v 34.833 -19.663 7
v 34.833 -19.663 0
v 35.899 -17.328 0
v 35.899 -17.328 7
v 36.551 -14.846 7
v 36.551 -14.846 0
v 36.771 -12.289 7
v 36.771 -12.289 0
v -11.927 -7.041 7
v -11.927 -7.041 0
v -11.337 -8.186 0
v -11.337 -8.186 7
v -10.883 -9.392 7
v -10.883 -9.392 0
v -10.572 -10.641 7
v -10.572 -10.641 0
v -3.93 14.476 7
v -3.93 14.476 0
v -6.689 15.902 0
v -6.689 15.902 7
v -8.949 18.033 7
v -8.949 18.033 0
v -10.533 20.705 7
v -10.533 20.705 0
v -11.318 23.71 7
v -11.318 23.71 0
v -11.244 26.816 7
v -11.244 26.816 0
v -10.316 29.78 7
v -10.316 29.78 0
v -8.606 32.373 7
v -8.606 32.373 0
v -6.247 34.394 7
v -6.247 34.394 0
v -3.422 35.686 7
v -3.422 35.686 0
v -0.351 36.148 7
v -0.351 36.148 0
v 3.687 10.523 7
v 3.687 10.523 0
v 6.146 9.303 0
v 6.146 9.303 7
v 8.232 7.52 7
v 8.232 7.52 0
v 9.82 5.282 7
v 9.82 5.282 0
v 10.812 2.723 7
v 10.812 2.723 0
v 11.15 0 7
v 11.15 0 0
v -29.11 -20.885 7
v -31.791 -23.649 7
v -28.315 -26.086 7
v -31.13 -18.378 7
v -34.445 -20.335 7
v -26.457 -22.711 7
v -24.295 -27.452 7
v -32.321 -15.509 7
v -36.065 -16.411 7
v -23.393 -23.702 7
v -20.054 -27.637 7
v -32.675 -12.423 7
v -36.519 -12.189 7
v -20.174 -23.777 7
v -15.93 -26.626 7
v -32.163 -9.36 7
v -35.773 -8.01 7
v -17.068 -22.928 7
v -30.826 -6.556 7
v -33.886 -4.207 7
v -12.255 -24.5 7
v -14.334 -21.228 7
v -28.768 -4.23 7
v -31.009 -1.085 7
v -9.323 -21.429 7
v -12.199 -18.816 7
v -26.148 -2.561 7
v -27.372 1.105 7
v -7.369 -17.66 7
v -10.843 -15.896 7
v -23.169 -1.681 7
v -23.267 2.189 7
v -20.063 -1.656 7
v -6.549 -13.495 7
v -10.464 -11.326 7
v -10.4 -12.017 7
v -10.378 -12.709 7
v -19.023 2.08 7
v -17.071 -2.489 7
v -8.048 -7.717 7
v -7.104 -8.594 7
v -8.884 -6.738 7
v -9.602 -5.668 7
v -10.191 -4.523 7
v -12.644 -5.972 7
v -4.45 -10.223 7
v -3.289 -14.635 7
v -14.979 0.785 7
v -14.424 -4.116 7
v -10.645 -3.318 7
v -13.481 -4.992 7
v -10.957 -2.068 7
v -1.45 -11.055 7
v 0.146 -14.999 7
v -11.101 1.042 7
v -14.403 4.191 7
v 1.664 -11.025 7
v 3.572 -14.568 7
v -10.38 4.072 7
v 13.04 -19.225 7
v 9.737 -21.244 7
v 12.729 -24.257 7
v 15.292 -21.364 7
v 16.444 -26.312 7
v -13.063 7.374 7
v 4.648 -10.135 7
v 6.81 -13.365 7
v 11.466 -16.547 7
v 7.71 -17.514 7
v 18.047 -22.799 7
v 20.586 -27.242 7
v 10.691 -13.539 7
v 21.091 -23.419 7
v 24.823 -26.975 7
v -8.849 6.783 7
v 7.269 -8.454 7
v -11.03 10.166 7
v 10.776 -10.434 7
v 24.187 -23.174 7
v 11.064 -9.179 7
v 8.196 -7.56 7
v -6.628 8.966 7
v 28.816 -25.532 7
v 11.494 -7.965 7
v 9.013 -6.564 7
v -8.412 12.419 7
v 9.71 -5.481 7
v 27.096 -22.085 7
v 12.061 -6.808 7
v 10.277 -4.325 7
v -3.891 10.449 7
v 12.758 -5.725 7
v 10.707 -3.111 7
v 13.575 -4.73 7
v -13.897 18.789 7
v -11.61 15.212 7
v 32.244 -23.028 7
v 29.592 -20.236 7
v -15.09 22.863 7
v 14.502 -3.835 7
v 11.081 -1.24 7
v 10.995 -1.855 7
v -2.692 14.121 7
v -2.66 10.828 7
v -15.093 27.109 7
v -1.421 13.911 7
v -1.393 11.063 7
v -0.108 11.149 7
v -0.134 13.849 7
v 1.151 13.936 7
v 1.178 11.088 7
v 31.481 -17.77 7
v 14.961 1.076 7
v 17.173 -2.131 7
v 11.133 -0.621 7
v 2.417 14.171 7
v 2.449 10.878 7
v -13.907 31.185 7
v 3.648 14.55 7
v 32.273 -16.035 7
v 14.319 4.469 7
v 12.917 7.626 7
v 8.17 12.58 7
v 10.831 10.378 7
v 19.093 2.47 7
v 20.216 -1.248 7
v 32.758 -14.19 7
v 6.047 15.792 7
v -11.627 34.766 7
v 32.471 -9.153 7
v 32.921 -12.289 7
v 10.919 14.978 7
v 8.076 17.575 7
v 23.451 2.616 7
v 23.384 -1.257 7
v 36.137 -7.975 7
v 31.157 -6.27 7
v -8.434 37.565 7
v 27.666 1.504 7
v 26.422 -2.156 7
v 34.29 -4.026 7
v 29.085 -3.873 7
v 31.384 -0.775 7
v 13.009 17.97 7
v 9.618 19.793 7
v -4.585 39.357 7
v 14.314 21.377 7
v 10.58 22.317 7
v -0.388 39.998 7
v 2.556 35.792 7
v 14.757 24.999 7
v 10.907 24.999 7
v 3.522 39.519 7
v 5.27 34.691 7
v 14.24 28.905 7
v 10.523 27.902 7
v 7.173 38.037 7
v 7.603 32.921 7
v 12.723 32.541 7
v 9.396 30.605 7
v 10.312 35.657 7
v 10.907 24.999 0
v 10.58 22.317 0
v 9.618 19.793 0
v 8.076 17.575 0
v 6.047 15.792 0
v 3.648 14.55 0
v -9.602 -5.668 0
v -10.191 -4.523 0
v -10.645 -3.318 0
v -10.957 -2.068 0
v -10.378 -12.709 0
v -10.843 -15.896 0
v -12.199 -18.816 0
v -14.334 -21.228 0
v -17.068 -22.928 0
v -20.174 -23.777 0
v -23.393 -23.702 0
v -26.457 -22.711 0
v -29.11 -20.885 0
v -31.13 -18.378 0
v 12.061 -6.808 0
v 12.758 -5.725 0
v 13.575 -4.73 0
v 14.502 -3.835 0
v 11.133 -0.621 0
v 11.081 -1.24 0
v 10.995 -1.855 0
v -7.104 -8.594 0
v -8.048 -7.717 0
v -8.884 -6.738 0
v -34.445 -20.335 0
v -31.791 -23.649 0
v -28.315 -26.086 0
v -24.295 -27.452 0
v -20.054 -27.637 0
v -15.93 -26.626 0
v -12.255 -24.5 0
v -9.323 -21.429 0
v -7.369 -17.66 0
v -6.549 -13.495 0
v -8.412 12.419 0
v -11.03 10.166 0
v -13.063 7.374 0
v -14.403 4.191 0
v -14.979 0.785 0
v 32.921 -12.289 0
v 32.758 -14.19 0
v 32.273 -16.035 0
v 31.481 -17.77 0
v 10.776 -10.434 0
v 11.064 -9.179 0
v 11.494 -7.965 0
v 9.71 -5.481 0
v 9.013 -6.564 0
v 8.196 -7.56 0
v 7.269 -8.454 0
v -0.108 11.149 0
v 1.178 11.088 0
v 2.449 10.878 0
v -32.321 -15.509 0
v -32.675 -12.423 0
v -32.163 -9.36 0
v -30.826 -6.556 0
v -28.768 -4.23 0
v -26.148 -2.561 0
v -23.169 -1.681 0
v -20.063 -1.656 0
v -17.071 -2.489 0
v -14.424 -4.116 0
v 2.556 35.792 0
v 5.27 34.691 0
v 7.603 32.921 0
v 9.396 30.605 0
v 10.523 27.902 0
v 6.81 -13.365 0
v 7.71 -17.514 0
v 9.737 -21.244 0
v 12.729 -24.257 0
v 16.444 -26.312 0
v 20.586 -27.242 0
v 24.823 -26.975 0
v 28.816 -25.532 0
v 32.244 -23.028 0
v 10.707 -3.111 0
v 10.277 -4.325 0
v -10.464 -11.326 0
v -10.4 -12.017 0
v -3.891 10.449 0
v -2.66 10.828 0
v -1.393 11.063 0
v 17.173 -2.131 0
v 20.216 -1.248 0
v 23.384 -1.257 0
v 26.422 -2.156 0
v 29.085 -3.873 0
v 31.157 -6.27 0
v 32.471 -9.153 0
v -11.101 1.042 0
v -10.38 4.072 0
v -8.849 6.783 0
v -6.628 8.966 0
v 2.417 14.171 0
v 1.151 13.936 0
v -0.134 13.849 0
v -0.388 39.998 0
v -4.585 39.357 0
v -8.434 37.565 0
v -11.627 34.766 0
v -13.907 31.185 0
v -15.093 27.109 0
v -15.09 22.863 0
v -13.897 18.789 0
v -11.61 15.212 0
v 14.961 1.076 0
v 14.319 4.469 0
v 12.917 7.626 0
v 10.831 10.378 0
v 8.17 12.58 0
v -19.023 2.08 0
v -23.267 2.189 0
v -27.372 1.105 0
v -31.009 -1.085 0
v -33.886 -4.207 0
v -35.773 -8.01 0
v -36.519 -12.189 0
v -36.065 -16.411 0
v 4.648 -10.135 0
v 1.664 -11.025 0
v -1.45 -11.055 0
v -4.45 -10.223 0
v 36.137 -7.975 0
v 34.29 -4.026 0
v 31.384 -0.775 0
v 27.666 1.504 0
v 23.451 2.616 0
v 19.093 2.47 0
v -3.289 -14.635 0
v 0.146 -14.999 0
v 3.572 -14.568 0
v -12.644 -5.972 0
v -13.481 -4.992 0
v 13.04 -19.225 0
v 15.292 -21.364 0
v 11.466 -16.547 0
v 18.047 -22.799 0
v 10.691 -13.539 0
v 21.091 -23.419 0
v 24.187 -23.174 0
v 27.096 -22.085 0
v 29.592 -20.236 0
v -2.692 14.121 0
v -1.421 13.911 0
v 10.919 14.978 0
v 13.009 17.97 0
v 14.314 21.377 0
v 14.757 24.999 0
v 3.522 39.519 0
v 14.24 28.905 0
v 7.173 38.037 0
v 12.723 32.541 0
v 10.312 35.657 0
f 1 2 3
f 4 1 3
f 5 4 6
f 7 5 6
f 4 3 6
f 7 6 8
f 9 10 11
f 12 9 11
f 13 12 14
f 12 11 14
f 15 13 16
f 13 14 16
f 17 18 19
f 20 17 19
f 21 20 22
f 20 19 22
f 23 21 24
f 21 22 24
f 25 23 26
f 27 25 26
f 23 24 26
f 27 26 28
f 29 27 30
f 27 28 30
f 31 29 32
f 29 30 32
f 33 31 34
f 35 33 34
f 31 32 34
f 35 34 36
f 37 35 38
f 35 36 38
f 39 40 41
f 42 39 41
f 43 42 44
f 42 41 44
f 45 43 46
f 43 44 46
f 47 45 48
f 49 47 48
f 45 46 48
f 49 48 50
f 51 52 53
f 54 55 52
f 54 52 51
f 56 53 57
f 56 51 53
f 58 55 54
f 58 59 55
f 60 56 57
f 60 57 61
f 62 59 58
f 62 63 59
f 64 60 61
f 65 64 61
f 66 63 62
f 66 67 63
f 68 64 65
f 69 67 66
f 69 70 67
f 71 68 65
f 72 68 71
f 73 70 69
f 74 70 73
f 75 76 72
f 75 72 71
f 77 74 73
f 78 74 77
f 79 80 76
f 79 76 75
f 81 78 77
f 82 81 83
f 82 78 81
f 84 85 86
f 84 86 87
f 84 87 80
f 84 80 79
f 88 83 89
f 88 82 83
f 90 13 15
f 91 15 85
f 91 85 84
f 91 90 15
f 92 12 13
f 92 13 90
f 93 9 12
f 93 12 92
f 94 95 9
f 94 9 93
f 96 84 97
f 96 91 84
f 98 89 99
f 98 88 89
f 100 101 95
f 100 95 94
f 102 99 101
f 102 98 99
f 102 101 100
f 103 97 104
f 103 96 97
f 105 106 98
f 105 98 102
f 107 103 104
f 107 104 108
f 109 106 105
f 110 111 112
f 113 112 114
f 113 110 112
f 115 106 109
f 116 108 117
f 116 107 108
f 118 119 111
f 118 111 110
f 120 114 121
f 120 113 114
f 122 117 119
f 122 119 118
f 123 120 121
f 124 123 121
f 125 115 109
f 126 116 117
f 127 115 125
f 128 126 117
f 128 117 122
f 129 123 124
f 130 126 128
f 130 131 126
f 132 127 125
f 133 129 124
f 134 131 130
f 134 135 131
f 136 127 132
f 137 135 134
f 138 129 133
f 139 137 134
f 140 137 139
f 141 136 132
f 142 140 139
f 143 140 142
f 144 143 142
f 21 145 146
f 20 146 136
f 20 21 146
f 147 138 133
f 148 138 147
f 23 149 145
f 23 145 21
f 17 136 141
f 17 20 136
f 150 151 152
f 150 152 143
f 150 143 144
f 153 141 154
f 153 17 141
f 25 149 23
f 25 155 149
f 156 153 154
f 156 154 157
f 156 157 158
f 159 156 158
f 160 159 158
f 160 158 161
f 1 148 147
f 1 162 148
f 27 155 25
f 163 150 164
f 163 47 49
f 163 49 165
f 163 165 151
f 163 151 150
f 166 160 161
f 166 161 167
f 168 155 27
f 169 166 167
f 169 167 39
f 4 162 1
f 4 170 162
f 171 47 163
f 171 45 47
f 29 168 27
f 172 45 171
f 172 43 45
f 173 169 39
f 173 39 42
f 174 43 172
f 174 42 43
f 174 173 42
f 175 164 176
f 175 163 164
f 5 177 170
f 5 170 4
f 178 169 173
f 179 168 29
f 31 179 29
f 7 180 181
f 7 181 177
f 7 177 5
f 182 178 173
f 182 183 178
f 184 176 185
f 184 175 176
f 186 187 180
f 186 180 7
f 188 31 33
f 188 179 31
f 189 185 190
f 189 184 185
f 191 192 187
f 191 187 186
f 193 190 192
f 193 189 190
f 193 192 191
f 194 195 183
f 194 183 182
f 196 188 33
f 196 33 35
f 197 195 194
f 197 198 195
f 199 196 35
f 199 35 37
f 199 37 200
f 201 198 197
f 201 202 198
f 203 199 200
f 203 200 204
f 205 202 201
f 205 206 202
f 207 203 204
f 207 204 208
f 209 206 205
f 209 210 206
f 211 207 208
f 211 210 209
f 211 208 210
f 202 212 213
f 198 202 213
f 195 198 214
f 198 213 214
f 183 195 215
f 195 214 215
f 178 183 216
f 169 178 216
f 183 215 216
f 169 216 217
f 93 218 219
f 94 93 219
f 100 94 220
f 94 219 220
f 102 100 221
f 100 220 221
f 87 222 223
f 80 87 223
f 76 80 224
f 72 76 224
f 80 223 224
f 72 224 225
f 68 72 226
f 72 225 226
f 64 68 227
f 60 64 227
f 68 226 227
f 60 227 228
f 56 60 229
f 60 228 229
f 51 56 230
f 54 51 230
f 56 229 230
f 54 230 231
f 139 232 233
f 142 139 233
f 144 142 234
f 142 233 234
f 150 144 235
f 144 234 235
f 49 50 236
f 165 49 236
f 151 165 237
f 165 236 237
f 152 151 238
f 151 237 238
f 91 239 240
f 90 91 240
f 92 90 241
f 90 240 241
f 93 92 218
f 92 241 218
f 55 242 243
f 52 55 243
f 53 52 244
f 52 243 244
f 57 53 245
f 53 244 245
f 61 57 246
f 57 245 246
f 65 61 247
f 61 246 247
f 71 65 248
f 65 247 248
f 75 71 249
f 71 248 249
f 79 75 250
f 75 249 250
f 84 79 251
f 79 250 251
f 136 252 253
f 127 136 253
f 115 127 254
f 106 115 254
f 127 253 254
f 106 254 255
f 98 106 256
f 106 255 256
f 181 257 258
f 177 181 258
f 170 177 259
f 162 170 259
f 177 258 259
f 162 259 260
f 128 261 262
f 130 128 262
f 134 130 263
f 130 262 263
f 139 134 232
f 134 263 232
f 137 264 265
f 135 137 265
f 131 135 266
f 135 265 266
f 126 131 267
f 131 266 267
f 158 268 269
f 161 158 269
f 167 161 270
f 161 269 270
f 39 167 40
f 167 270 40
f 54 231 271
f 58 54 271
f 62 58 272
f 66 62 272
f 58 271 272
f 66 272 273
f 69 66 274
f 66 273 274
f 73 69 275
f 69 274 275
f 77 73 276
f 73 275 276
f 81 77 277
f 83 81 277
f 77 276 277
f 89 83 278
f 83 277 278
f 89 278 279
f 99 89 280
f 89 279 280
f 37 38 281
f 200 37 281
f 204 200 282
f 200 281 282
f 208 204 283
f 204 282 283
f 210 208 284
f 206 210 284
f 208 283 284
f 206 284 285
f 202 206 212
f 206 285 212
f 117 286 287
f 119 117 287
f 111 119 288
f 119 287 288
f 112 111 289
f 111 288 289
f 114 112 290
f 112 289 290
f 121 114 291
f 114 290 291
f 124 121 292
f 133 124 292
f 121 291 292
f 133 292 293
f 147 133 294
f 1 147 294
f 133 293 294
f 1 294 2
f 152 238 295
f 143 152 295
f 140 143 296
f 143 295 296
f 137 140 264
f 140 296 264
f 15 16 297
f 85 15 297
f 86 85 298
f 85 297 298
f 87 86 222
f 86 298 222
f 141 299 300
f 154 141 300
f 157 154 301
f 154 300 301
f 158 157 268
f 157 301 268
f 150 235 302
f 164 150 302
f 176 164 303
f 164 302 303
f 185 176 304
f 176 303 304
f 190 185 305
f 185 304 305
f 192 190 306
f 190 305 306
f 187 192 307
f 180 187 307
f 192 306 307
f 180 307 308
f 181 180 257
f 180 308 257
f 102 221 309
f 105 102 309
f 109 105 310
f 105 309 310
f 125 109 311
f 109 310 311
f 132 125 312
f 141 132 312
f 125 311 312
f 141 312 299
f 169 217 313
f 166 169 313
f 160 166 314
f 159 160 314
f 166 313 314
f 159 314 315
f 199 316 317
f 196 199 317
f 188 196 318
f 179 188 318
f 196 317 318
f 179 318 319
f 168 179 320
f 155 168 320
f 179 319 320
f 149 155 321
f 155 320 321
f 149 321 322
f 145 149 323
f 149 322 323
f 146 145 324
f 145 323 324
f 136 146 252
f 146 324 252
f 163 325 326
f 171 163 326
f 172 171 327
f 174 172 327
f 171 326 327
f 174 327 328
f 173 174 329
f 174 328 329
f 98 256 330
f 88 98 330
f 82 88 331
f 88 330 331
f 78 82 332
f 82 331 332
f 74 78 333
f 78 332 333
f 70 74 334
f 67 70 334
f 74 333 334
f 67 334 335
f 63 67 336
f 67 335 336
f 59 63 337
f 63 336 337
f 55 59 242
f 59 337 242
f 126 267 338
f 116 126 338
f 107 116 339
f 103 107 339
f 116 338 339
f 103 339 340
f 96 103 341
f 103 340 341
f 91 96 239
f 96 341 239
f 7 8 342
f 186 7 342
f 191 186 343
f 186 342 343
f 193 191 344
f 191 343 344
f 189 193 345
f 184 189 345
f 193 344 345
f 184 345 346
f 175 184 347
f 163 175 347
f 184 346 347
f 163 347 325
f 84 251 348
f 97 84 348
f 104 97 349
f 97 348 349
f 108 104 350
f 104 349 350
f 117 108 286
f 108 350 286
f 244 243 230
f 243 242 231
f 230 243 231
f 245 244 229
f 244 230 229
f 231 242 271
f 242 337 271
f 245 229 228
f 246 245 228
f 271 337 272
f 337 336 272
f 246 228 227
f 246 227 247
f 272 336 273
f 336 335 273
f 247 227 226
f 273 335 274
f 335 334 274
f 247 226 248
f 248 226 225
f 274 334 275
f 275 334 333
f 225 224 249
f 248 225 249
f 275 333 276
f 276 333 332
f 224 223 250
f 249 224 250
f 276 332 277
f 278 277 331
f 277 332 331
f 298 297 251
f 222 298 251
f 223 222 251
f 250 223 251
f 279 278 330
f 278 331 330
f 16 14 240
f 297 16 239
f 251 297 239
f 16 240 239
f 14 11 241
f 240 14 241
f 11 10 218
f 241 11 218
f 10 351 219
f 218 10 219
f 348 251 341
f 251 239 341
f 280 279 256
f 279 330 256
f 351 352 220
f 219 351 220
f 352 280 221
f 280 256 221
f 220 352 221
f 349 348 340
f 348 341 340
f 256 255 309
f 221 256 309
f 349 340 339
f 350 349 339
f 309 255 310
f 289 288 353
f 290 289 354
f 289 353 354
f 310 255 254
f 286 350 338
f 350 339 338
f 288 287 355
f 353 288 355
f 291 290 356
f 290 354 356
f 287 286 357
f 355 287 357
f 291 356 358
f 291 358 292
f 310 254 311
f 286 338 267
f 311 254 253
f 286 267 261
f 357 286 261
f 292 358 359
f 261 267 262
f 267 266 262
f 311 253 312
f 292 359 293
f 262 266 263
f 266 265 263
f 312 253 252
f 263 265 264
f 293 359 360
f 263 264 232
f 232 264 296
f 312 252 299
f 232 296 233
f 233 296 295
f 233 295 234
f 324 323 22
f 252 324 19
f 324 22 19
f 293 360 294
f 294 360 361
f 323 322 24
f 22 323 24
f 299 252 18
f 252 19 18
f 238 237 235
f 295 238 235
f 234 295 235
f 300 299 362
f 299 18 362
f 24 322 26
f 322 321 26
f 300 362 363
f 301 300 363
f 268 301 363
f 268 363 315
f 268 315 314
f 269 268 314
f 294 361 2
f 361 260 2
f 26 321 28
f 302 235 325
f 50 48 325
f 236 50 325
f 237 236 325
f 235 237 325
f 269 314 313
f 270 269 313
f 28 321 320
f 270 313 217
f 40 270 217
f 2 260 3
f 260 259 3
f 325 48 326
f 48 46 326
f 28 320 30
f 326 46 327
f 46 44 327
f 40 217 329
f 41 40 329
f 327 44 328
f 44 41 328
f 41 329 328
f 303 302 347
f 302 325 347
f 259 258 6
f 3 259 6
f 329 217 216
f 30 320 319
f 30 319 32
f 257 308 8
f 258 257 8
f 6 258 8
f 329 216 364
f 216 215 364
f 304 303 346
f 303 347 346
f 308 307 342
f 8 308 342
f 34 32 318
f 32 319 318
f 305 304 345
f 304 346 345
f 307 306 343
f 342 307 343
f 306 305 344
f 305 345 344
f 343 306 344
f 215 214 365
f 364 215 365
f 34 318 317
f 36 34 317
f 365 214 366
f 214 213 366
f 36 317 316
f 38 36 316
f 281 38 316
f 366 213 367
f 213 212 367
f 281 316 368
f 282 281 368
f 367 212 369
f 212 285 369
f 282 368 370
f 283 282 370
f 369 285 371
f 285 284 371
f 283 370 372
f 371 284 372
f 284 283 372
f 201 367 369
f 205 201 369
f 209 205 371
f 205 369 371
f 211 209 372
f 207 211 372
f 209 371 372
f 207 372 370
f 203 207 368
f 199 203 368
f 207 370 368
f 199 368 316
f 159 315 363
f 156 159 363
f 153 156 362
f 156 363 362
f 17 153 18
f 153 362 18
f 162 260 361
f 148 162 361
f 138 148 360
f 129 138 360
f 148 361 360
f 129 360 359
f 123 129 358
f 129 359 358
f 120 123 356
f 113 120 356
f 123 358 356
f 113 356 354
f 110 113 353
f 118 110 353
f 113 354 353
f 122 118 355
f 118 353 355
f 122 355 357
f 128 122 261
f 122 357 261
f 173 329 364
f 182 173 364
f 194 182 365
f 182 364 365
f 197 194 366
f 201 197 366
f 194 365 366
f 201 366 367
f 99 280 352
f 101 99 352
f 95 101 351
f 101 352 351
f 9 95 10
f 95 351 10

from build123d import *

# Parameters (mm, degrees)
F1_DEPTH = 7


with BuildPart() as f1:
    # F0 (on Top) → F1 (new body)
    with BuildSketch(Plane.XY):
        with BuildLine():
            ThreePointArc((-3.8906200654, 10.4491901843), (-2.0298332845, 10.9636798949), (-0.1081914722, 11.1494750821))
            Line((-0.1081914722, 11.1494750821), (-0.1343903041, 13.8493479719))
            ThreePointArc((-0.1343903041, 13.8493479719), (-2.0592757302, 13.9978175054), (-3.9296961082, 14.4761005971))
            ThreePointArc((-3.9296961082, 14.4761005971), (-6.2562113602, 13.6330414588), (-8.4124625152, 12.4189562537))
            ThreePointArc((-8.4124625152, 12.4189562537), (-6.2330573108, 11.2469430781), (-3.8906200654, 10.4491901843))
        make_face()
        with BuildLine():
            Line((-0.1343903041, 13.8493479719), (-0.1081914722, 11.1494750821))
            ThreePointArc((-0.1081914722, 11.1494750821), (1.8166939539, 11.0010055485), (3.6871143319, 10.5227224568))
            ThreePointArc((3.6871143319, 10.5227224568), (6.0136295839, 11.3657815952), (8.1698807389, 12.5798668003))
            ThreePointArc((8.1698807389, 12.5798668003), (5.9904755345, 13.7518799759), (3.648038289, 14.5496328697))
            ThreePointArc((3.648038289, 14.5496328697), (1.7872515082, 14.0351431591), (-0.1343903041, 13.8493479719))
        make_face()
        with BuildLine():
            ThreePointArc((-10.9565021305, -2.0682265504), (-9.709824396, 5.4810409776), (-3.8906200654, 10.4491901843))
            ThreePointArc((-3.8906200654, 10.4491901843), (-6.2330573108, 11.2469430781), (-8.4124625152, 12.4189562537))
            ThreePointArc((-8.4124625152, 12.4189562537), (-13.0625440306, 7.3735977277), (-14.9794245947, 0.7853908656))
            ThreePointArc((-14.9794245947, 0.7853908656), (-12.8498703872, -0.474934809), (-10.9565021305, -2.0682265504))
        make_face()
        with BuildLine():
            ThreePointArc((8.1698807389, 12.5798668003), (6.0136295839, 11.3657815952), (3.6871143319, 10.5227224568))
            ThreePointArc((3.6871143319, 10.5227224568), (9.0948838585, 6.4502393444), (11.15, 0))
            ThreePointArc((11.15, 0), (11.1110756032, -0.930859248), (10.9945741812, -1.8552192791))
            ThreePointArc((10.9945741812, -1.8552192791), (12.8566670759, -0.2254855646), (14.9613628618, 1.0759281197))
            ThreePointArc((14.9613628618, 1.0759281197), (12.9169949647, 7.6256961047), (8.1698807389, 12.5798668003))
        make_face()
        with BuildLine():
            ThreePointArc((10.9945741812, -1.8552192791), (10.5097419502, -3.7239527576), (9.709824396, -5.4810409776))
            Line((9.709824396, -5.4810409776), (12.0610823215, -6.8082885686))
            ThreePointArc((12.0610823215, -6.8082885686), (13.1521034224, -5.2155236569), (14.5015189189, -3.8348336397))
            ThreePointArc((14.5015189189, -3.8348336397), (14.87485771, -1.933548062), (15, 0))
            ThreePointArc((15, 0), (14.9903376034, 0.538310818), (14.9613628618, 1.0759281197))
            ThreePointArc((14.9613628618, 1.0759281197), (12.8566670759, -0.2254855646), (10.9945741812, -1.8552192791))
        make_face()
        with BuildLine():
            Line((12.0610823215, -6.8082885686), (9.709824396, -5.4810409776))
            ThreePointArc((9.709824396, -5.4810409776), (8.6188032952, -7.0738058892), (7.2693877987, -8.4544959065))
            ThreePointArc((7.2693877987, -8.4544959065), (6.8362408033, -10.8908467862), (6.8095438558, -13.3652576659))
            ThreePointArc((6.8095438558, -13.3652576659), (8.9142396416, -12.0638439816), (10.7763325364, -10.4341102671))
            ThreePointArc((10.7763325364, -10.4341102671), (11.2611647674, -8.5653767885), (12.0610823215, -6.8082885686))
        make_face()
        with BuildLine():
            ThreePointArc((6.8095438558, -13.3652576659), (6.8362408033, -10.8908467862), (7.2693877987, -8.4544959065))
            ThreePointArc((7.2693877987, -8.4544959065), (0.1081914722, -11.1494750821), (-7.1039541159, -8.5939709052))
            ThreePointArc((-7.1039541159, -8.5939709052), (-6.6729292484, -10.6317016968), (-6.5283249412, -12.7094935078))
            ThreePointArc((-6.5283249412, -12.7094935078), (-6.5334696748, -13.1023236743), (-6.5489003466, -13.4948843734))
            ThreePointArc((-6.5489003466, -13.4948843734), (0.1455490658, -14.9992938324), (6.8095438558, -13.3652576659))
        make_face()
        with BuildLine():
            ThreePointArc((-7.1039541159, -8.5939709052), (-8.4799086657, -7.2397271373), (-9.6016329238, -5.6684341045))
            Line((-9.6016329238, -5.6684341045), (-11.9266920175, -7.0410594033))
            ThreePointArc((-11.9266920175, -7.0410594033), (-11.0928276921, -8.7822938485), (-10.5718228107, -10.6412669574))
            ThreePointArc((-10.5718228107, -10.6412669574), (-8.678454554, -12.2345586988), (-6.5489003466, -13.4948843734))
            ThreePointArc((-6.5489003466, -13.4948843734), (-6.5334696748, -13.1023236743), (-6.5283249412, -12.7094935078))
            ThreePointArc((-6.5283249412, -12.7094935078), (-6.6729292484, -10.6317016968), (-7.1039541159, -8.5939709052))
        make_face()
        with BuildLine():
            Line((-11.9266920175, -7.0410594033), (-9.6016329238, -5.6684341045))
            ThreePointArc((-9.6016329238, -5.6684341045), (-10.4354972491, -3.9271996593), (-10.9565021305, -2.0682265504))
            ThreePointArc((-10.9565021305, -2.0682265504), (-12.8498703872, -0.474934809), (-14.9794245947, 0.7853908656))
            ThreePointArc((-14.9794245947, 0.7853908656), (-14.9047151761, -1.6880359943), (-14.4243708254, -4.1155226026))
            ThreePointArc((-14.4243708254, -4.1155226026), (-13.0484162756, -5.4697663705), (-11.9266920175, -7.0410594033))
        make_face()
        with BuildLine():
            ThreePointArc((-0.3881308421, 39.9981168863), (-14.6453286848, 29.1893935987), (-8.4124625152, 12.4189562537))
            ThreePointArc((-8.4124625152, 12.4189562537), (-6.2562113602, 13.6330414588), (-3.9296961082, 14.4761005971))
            ThreePointArc((-3.9296961082, 14.4761005971), (-11.2435873248, 26.8155170078), (-0.3507732486, 36.148298136))
            Line((-0.3507732486, 36.148298136), (-0.3881308421, 39.9981168863))
        make_face()
        with BuildLine():
            ThreePointArc((3.648038289, 14.5496328697), (5.9904755345, 13.7518799759), (8.1698807389, 12.5798668003))
            ThreePointArc((8.1698807389, 12.5798668003), (13.0085868085, 17.9698450958), (14.7574182237, 24.9988230539))
            ThreePointArc((14.7574182237, 24.9988230539), (10.3124351354, 35.6567599084), (-0.3881308421, 39.9981168863))
            Line((-0.3881308421, 39.9981168863), (-0.3507732486, 36.148298136))
            ThreePointArc((-0.3507732486, 36.148298136), (7.603314128, 32.9212227824), (10.9074182237, 24.9988230539))
            ThreePointArc((10.9074182237, 24.9988230539), (8.9144623354, 18.6371374962), (3.648038289, 14.5496328697))
        make_face()
        with BuildLine():
            ThreePointArc((36.7709067176, -12.2893295462), (29.6085352544, 0.5001809573), (14.9613628618, 1.0759281197))
            ThreePointArc((14.9613628618, 1.0759281197), (14.9903376034, 0.538310818), (15, 0))
            ThreePointArc((15, 0), (14.87485771, -1.933548062), (14.5015189189, -3.8348336397))
            ThreePointArc((14.5015189189, -3.8348336397), (26.4221875114, -2.1558164842), (32.9209067176, -12.2893295462))
            ThreePointArc((32.9209067176, -12.2893295462), (32.5548540936, -15.1228748506), (31.4807311136, -17.7703705237))
            Line((31.4807311136, -17.7703705237), (34.8334507481, -19.6629272739))
            ThreePointArc((34.8334507481, -19.6629272739), (36.2784592413, -16.1012739018), (36.7709067176, -12.2893295462))
        make_face()
        with BuildLine():
            ThreePointArc((10.7763325364, -10.4341102671), (8.9142396416, -12.0638439816), (6.8095438558, -13.3652576659))
            ThreePointArc((6.8095438558, -13.3652576659), (18.4820560276, -26.9243376138), (34.8334507481, -19.6629272739))
            Line((34.8334507481, -19.6629272739), (31.4807311136, -17.7703705237))
            ThreePointArc((31.4807311136, -17.7703705237), (18.04695396, -22.7990714963), (10.7763325364, -10.4341102671))
        make_face()
        with BuildLine():
            ThreePointArc((-14.4243708254, -4.1155226026), (-14.9047151761, -1.6880359943), (-14.9794245947, 0.7853908656))
            ThreePointArc((-14.9794245947, 0.7853908656), (-32.5581883674, -2.5437612272), (-34.445319906, -20.3351896124))
            Line((-34.445319906, -20.3351896124), (-31.129957865, -18.3779276122))
            ThreePointArc((-31.129957865, -18.3779276122), (-28.7680520785, -4.2295848421), (-14.4243708254, -4.1155226026))
        make_face()
        with BuildLine():
            ThreePointArc((-34.445319906, -20.3351896124), (-17.9560920351, -27.2779234872), (-6.5489003466, -13.4948843734))
            ThreePointArc((-6.5489003466, -13.4948843734), (-8.678454554, -12.2345586988), (-10.5718228107, -10.6412669574))
            ThreePointArc((-10.5718228107, -10.6412669574), (-10.4268048031, -11.6708643043), (-10.3783249412, -12.7094935078))
            ThreePointArc((-10.3783249412, -12.7094935078), (-18.5902734696, -23.4654385406), (-31.129957865, -18.3779276122))
            Line((-31.129957865, -18.3779276122), (-34.445319906, -20.3351896124))
        make_face()
    extrude(amount=F1_DEPTH)


solid = f1.part
